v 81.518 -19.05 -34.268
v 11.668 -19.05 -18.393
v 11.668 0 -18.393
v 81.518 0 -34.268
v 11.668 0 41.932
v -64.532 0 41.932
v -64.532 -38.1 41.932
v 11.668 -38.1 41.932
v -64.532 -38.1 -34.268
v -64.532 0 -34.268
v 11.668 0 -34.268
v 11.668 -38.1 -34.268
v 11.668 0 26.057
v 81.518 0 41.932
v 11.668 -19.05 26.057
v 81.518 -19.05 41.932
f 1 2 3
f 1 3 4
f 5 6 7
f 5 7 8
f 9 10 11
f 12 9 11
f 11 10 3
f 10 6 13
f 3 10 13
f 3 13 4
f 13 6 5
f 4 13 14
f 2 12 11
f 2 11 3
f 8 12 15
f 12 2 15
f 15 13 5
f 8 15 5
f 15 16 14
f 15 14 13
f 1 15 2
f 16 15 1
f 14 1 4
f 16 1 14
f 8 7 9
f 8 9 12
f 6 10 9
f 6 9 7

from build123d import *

# Parameters (mm, degrees)
F0_W     = 76.2
F0_H     = 76.2
F1_DEPTH = 38.1
F2_W     = 19.05
F2_H     = 44.45
F3_DEPTH = 69.85
F5_DEPTH = 19.05


with BuildPart() as f1:
    # F0 (on Front) → F1 (new body)
    with BuildSketch(Plane.XZ):
        with Locations((-26.431875, 3.83165)):
            Rectangle(F0_W, F0_H)
    extrude(amount=F1_DEPTH)

    # F2 (on face) → F3 (join)
    with BuildSketch(Plane.YZ.offset(11.668125)):
        with Locations((-9.525, 3.83165)):
            Rectangle(F2_W, F2_H)
    extrude(amount=F3_DEPTH)

    # F4 (on face) → F5 (join)
    with BuildSketch(Plane.XZ.offset(19.05)):
        Polygon((81.518125, 41.93165), (11.668125, 26.05665), (81.518125, 26.05665), align=None)
        Polygon((81.518125, -18.39335), (11.668125, -18.39335), (81.518125, -34.26835), align=None)
    extrude(amount=-F5_DEPTH)


solid = f1.part
